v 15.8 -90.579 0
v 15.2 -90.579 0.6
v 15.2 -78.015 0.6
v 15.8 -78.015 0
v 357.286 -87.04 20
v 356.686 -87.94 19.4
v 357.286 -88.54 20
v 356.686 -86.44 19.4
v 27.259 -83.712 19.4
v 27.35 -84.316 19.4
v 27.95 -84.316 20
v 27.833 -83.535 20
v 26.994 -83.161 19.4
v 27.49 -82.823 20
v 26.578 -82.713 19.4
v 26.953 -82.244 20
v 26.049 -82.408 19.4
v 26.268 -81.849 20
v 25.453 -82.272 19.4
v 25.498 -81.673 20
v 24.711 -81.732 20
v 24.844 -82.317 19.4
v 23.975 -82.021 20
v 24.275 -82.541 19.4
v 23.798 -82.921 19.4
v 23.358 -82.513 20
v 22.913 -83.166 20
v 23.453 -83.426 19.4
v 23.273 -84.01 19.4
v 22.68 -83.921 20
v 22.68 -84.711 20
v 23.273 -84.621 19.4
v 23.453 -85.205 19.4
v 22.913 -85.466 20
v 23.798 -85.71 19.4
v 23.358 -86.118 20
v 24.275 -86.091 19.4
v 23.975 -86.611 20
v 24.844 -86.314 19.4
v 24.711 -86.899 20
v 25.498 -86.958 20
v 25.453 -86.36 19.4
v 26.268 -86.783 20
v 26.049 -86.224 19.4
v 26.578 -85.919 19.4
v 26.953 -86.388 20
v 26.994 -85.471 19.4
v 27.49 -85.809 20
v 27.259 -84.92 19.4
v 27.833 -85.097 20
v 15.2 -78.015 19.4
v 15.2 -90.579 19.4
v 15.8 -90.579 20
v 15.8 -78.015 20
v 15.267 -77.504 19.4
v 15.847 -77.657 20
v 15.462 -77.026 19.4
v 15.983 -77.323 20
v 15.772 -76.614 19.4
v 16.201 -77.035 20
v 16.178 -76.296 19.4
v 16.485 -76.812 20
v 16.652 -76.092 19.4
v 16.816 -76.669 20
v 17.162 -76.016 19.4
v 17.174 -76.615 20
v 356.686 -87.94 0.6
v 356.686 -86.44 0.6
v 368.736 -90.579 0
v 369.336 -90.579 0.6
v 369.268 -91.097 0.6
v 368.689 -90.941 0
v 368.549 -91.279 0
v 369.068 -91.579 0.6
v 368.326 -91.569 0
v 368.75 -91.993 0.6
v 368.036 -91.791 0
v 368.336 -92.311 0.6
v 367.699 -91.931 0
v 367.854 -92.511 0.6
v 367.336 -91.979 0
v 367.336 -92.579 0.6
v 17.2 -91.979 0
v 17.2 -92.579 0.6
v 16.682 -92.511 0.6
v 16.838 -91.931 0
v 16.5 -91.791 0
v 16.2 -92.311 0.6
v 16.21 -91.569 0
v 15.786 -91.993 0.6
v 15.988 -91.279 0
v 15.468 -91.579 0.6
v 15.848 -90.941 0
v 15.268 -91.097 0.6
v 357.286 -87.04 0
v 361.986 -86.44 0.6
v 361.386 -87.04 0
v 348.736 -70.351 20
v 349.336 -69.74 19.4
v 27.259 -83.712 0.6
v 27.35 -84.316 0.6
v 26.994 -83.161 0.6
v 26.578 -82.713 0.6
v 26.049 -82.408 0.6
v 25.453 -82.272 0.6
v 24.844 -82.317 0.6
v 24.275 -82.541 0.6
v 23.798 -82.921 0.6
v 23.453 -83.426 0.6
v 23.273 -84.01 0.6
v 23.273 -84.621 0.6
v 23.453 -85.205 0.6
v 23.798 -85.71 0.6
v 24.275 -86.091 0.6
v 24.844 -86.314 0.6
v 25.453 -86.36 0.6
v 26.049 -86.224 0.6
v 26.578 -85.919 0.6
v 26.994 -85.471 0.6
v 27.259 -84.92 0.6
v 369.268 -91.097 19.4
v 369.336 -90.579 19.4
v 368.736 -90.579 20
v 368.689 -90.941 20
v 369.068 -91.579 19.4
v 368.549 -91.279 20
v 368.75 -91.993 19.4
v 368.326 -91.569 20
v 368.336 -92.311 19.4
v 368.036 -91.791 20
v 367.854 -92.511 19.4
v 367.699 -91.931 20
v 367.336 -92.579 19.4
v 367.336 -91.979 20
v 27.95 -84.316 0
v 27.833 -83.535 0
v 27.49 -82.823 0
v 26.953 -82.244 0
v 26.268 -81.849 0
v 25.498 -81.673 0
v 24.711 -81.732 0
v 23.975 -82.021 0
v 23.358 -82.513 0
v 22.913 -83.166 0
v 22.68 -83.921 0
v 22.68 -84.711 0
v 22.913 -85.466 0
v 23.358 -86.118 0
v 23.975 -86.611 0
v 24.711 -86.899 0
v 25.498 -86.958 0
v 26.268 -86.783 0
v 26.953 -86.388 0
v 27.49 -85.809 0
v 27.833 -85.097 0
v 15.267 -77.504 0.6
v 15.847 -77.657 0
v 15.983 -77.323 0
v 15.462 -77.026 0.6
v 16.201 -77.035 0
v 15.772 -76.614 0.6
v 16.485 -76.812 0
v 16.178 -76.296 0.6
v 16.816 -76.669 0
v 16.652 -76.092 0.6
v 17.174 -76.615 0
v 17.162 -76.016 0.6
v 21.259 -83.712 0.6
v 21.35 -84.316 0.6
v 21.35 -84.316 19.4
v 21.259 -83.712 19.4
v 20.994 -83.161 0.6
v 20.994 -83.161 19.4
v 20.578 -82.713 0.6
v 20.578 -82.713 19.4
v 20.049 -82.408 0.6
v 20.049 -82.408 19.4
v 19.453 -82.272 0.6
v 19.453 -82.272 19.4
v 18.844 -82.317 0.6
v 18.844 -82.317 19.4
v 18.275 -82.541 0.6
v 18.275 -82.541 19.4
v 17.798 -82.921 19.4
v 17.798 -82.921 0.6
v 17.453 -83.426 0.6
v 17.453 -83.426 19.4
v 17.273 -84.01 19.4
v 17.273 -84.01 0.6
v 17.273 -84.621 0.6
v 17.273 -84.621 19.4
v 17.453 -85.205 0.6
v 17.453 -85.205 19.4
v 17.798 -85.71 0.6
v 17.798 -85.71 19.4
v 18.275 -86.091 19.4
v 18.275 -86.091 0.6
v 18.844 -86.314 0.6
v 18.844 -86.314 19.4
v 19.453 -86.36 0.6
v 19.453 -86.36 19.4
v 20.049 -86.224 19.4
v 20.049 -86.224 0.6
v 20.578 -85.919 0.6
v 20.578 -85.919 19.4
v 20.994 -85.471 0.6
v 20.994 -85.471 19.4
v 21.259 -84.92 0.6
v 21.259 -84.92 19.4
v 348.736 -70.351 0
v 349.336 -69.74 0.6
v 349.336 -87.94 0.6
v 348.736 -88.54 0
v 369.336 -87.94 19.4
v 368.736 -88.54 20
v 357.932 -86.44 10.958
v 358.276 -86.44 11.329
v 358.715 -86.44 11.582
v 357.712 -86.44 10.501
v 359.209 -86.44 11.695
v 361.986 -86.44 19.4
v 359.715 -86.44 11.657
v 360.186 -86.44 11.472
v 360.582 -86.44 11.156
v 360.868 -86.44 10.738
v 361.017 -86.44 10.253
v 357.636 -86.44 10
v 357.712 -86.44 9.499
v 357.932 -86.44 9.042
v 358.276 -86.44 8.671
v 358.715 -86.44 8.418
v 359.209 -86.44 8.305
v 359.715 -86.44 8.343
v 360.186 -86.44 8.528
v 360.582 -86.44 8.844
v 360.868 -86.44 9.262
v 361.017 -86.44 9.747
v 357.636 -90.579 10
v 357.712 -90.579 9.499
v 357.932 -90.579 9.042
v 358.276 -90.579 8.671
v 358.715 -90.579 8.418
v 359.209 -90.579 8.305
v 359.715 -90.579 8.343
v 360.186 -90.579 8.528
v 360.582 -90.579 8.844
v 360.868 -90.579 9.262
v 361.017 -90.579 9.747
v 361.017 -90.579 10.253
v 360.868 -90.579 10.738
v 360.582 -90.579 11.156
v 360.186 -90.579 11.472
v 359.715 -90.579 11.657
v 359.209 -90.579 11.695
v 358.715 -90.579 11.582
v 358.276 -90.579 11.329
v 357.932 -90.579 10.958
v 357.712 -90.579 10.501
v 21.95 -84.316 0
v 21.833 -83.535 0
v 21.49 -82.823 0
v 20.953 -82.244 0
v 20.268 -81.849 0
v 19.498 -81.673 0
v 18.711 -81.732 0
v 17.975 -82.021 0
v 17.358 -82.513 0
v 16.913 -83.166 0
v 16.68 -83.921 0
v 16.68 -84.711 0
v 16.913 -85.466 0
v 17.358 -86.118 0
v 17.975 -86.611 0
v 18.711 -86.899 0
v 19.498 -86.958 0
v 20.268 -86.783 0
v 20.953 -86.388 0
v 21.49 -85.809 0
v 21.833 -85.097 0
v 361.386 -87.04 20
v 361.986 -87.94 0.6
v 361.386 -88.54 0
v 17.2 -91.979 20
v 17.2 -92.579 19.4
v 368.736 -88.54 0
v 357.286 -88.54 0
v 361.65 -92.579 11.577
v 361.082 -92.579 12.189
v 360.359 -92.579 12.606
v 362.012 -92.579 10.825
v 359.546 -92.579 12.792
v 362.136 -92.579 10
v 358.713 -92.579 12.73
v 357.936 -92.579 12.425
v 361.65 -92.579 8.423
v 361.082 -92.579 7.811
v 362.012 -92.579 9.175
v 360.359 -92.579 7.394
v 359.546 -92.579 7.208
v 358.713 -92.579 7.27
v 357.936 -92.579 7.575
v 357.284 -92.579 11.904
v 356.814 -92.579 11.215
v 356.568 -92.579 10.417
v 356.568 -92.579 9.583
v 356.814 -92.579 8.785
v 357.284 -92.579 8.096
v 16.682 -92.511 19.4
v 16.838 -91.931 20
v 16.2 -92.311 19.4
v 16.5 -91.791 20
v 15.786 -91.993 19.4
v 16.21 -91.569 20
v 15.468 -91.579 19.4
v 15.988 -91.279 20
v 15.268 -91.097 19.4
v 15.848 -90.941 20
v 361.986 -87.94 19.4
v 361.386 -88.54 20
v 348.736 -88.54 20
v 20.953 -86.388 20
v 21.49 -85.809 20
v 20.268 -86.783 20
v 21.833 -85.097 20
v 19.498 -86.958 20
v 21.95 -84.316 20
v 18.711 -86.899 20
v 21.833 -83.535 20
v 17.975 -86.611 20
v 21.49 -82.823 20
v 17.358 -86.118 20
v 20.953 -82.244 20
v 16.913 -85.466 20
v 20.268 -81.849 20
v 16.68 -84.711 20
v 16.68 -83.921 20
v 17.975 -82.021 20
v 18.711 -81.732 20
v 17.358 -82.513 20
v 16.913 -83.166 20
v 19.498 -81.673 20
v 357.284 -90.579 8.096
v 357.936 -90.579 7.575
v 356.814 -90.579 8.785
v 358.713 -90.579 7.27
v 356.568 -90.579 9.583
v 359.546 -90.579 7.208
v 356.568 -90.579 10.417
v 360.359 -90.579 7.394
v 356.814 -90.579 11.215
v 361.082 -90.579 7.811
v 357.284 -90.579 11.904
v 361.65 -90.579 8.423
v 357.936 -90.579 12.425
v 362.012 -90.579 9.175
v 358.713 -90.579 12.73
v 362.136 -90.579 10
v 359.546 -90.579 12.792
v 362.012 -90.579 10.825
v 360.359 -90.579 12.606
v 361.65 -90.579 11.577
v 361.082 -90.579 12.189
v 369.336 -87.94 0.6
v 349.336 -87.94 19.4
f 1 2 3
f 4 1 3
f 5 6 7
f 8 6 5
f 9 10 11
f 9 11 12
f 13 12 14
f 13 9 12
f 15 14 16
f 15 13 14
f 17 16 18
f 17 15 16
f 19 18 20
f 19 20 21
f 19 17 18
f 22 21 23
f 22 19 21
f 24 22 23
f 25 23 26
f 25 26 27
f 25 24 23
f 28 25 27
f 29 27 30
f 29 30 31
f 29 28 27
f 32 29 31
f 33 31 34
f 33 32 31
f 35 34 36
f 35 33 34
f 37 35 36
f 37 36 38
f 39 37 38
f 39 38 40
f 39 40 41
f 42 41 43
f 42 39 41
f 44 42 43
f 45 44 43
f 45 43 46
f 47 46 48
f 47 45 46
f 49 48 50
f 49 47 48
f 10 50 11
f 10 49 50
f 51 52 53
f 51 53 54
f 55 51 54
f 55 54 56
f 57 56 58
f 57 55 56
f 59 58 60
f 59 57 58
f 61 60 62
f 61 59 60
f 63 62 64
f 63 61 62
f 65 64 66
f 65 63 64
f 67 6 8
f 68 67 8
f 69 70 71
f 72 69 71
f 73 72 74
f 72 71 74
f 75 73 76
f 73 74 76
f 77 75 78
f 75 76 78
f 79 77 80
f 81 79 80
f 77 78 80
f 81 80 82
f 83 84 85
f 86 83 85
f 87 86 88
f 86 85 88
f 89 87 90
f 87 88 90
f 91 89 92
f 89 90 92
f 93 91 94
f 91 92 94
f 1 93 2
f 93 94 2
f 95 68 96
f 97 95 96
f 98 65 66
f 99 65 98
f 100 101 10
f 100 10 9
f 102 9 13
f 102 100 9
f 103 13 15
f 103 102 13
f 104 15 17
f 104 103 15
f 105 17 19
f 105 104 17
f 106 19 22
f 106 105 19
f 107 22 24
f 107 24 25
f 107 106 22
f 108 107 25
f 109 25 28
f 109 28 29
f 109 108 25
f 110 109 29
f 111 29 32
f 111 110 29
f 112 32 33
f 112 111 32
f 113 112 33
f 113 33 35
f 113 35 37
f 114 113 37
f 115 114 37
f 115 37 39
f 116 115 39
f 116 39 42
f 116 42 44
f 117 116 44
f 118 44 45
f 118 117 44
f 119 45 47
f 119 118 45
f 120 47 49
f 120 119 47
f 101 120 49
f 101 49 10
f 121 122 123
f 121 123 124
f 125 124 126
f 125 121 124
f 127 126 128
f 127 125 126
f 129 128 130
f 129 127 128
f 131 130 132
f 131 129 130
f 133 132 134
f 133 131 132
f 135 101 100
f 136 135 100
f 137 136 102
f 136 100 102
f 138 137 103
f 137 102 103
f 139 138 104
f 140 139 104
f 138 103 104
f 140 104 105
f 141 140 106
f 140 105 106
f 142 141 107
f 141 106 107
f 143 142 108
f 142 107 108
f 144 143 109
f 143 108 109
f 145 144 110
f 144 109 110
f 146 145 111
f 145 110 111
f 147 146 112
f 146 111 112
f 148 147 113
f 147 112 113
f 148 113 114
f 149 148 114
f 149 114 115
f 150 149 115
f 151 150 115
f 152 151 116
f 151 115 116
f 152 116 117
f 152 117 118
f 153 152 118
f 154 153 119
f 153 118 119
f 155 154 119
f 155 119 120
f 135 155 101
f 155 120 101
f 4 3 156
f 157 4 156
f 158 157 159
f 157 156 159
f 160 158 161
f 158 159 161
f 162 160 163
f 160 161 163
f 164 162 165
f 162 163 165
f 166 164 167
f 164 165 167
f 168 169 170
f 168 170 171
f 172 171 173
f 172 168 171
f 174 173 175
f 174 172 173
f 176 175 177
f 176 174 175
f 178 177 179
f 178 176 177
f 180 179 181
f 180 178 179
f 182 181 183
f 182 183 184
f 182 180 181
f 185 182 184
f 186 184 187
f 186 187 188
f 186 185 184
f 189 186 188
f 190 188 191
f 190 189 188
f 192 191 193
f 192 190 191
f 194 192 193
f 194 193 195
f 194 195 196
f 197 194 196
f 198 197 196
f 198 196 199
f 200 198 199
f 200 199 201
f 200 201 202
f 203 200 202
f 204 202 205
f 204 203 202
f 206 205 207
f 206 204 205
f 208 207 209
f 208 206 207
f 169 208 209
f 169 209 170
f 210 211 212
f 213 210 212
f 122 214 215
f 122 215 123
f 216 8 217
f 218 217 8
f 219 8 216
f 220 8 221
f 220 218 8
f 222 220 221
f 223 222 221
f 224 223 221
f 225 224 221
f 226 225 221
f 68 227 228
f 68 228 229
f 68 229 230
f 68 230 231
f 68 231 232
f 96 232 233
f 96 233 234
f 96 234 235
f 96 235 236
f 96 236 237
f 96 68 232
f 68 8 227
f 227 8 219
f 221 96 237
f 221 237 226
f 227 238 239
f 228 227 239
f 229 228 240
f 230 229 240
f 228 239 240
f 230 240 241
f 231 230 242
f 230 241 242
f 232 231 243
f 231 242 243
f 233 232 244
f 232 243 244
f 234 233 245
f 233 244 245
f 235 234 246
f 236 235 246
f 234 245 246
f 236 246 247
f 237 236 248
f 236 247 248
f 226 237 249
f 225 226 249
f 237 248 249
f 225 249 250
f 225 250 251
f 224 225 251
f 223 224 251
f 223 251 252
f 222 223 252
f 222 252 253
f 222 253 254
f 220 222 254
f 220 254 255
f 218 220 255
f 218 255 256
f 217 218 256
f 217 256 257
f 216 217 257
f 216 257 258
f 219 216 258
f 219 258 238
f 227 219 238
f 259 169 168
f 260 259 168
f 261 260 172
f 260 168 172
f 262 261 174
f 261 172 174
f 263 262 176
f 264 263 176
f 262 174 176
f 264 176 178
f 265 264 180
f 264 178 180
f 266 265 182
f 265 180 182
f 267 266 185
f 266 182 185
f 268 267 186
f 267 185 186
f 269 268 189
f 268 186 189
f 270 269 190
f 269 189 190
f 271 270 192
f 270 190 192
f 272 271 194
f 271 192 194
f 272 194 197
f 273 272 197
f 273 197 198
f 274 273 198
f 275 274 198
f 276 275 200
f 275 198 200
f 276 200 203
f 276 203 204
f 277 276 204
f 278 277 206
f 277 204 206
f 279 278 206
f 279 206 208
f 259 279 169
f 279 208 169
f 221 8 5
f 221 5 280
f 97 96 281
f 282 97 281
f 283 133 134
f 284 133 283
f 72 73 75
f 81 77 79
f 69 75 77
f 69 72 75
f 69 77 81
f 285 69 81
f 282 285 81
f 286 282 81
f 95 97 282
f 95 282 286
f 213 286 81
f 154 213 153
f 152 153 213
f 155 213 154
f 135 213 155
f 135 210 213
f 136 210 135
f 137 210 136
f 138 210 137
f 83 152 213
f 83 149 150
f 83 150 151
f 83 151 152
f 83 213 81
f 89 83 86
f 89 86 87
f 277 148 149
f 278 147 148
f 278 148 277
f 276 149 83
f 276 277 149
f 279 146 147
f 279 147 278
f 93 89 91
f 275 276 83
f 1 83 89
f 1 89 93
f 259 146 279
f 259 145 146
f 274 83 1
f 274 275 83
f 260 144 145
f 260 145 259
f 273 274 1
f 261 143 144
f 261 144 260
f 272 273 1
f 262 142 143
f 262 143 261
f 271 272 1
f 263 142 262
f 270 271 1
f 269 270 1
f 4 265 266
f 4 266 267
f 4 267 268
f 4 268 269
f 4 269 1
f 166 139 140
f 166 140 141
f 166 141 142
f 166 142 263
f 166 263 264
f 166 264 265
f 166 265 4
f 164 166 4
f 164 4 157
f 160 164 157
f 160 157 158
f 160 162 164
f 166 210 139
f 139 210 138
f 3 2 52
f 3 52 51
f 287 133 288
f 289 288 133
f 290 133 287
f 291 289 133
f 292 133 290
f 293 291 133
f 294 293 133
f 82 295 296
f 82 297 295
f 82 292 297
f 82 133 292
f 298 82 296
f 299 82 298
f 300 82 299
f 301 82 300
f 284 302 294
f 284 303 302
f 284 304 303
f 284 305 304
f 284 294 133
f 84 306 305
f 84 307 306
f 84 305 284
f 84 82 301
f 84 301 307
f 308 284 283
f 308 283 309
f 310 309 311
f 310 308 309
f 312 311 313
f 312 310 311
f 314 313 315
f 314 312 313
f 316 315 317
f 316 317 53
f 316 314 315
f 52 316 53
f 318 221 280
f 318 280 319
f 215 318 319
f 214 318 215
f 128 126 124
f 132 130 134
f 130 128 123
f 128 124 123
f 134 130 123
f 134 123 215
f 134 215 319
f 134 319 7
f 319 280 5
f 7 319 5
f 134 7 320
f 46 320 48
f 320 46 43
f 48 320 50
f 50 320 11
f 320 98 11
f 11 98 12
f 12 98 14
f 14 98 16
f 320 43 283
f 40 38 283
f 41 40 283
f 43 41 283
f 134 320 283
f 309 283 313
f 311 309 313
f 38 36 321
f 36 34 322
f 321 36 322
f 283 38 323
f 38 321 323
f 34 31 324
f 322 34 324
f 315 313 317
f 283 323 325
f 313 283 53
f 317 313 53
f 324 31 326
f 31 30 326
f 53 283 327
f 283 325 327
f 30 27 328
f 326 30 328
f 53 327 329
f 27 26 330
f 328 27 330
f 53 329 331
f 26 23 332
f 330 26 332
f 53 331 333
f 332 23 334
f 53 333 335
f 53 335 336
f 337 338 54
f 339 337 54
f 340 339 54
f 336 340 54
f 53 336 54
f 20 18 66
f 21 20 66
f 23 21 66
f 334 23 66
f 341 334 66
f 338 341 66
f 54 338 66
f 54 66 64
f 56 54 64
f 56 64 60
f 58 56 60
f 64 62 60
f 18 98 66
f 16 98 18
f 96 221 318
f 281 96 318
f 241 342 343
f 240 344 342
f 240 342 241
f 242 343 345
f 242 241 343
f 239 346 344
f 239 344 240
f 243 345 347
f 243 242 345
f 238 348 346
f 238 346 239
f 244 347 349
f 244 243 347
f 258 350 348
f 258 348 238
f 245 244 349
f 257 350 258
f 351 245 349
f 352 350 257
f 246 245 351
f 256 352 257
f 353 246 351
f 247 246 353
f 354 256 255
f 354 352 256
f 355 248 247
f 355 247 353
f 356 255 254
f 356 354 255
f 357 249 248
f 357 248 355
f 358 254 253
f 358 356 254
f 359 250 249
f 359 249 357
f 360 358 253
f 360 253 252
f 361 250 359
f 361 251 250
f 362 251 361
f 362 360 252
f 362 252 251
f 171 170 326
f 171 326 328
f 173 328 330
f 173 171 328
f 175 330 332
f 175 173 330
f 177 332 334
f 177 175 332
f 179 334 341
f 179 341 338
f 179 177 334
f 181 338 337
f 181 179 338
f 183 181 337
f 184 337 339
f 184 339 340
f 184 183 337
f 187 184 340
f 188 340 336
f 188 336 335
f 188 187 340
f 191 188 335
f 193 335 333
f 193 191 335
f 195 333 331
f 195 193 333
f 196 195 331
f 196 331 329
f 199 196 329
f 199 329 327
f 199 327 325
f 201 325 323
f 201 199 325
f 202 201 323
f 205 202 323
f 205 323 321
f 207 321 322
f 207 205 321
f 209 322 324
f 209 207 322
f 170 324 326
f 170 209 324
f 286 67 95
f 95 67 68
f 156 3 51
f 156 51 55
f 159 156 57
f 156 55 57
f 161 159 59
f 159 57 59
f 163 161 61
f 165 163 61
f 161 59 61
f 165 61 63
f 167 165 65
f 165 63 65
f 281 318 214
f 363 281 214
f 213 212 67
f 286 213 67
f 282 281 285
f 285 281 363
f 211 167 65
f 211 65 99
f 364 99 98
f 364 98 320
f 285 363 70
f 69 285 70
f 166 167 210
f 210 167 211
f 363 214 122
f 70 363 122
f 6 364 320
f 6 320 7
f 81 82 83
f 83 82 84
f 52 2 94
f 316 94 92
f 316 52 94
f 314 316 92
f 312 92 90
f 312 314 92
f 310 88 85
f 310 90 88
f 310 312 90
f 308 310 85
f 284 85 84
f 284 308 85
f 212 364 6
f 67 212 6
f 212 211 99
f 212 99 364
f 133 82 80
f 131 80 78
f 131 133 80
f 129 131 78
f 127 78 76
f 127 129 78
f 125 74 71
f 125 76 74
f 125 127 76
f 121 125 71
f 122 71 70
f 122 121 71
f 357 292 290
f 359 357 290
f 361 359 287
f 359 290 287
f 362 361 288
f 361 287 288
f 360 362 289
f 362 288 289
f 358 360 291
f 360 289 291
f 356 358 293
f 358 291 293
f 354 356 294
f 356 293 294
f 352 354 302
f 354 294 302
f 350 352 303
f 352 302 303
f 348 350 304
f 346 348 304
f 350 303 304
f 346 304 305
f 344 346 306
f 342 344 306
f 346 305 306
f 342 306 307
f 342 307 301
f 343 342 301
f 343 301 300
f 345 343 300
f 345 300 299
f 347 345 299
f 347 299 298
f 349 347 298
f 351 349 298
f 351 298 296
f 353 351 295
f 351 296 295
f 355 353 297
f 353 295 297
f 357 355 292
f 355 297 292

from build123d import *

# Parameters (mm, degrees)
SKETCH1_R           = 2.05
BOSS_EXTRUDE1_DEPTH = 20
SKETCH2_R           = 1.7
CUT_EXTRUDE1_DEPTH  = 20
SKETCH3_R           = 2.8
CUT_EXTRUDE2_DEPTH  = 2
FILLET1_R           = 2
CHAMFER1_SIZE       = 0.6
CHAMFER2_SIZE       = 0.6


with BuildPart() as part:
    # Sketch1 → Boss-Extrude1 (new body)
    with BuildSketch(Plane.XY):
        Polygon((15.2, -92.57905153), (15.2, -76.05265525), (349.336279792, -69.740004959), (349.336279792, -87.940004959), (356.686279792, -87.940004959), (356.686279792, -86.440004959), (361.986279792, -86.440004959), (361.986279792, -87.940004959), (369.336279792, -87.940004959), (369.336279792, -92.57905153), align=None)
        with Locations((25.300294751, -84.31585339)):
            Circle(SKETCH1_R, mode=Mode.SUBTRACT)
        with Locations((19.300294751, -84.31585339)):
            Circle(SKETCH1_R, mode=Mode.SUBTRACT)
    extrude(amount=BOSS_EXTRUDE1_DEPTH)

    # Sketch2 → Cut-Extrude1 (cut)
    with BuildSketch(Plane(origin=(0, -92.57905153, 0), x_dir=(-1, 0, 0), z_dir=(0, -1, 0))):
        with Locations((-359.336279792, -10)):
            Circle(SKETCH2_R)
    extrude(amount=-CUT_EXTRUDE1_DEPTH, mode=Mode.SUBTRACT)

    # Sketch3 → Cut-Extrude2 (cut)
    with BuildSketch(Plane.XZ.offset(92.57905153)):
        with Locations((359.336279792, 10)):
            Circle(SKETCH3_R)
    extrude(amount=-CUT_EXTRUDE2_DEPTH, mode=Mode.SUBTRACT)

    # Fillet1
    fillet1_edges = [part.edges().sort_by_distance(p)[0] for p in [
        (15.2, -92.57905153, 10),
        (15.2, -76.05265525, 10),
        (369.336279792, -92.57905153, 10),
    ]]
    fillet(fillet1_edges, radius=FILLET1_R)

    # Chamfer1
    chamfer1_edges = [part.edges().sort_by_distance(p)[0] for p in [
        (183.249250825, -72.877794523, 0),
        (349.336279792, -78.840004959, 0),
        (353.011279792, -87.940004959, 0),
        (356.686279792, -87.190004959, 0),
        (359.336279792, -86.440004959, 0),
        (361.986279792, -87.190004959, 0),
        (365.661279792, -87.940004959, 0),
        (23.250294751, -84.31585339, 0),
        (17.250294751, -84.31585339, 0),
        (369.336279792, -89.259528244, 0),
        (192.268139896, -92.57905153, 0),
        (15.2, -84.297139394, 0),
        (15.785786438, -91.993265092, 0),
        (15.772492332, -76.614433962, 0),
        (368.750493354, -91.993265092, 0),
    ]]
    chamfer(chamfer1_edges, length=CHAMFER1_SIZE)

    # Chamfer2
    chamfer2_edges = [part.edges().sort_by_distance(p)[0] for p in [
        (365.661279792, -87.940004959, 20),
        (361.986279792, -87.190004959, 20),
        (359.336279792, -86.440004959, 20),
        (356.686279792, -87.190004959, 20),
        (23.250294751, -84.31585339, 20),
        (353.011279792, -87.940004959, 20),
        (17.250294751, -84.31585339, 20),
        (349.336279792, -78.840004959, 20),
        (183.249250825, -72.877794523, 20),
        (369.336279792, -89.259528244, 20),
        (192.268139896, -92.57905153, 20),
        (15.2, -84.297139394, 20),
        (15.785786438, -91.993265092, 20),
        (15.772492332, -76.614433962, 20),
        (368.750493354, -91.993265092, 20),
    ]]
    chamfer(chamfer2_edges, length=CHAMFER2_SIZE)


solid = part.part
